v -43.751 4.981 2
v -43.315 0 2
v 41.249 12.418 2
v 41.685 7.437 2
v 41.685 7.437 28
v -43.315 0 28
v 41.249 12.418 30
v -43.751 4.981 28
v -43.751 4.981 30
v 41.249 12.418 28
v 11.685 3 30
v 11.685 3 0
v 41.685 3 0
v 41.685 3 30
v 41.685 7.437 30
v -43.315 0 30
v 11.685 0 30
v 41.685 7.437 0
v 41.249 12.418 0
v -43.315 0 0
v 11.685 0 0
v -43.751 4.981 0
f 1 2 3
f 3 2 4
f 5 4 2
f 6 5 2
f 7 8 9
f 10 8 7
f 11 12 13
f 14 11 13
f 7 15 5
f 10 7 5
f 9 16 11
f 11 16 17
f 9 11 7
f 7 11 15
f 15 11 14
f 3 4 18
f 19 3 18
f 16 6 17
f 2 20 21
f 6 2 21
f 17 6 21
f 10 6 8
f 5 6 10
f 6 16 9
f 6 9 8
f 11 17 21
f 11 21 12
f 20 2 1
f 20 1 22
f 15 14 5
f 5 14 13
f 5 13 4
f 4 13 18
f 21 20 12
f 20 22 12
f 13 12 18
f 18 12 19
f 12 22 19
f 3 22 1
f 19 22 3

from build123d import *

# Parameters (mm, degrees)
BOSS_EXTRUDE1_DEPTH = 30
SKETCH2_W           = 85.324686191
SKETCH2_H           = 2
BOSS_EXTRUDE2_DEPTH = 5


with BuildPart() as part:
    # Sketch1 → Boss-Extrude1 (new body)
    with BuildSketch(Plane.XY):
        Polygon((41.685097369, 7.4365364), (-43.314902631, 0), (11.685097369, 0), (11.685097369, 3), (41.685097369, 3), align=None)
    extrude(amount=BOSS_EXTRUDE1_DEPTH)

    # Sketch2 → Boss-Extrude2 (add)
    with BuildSketch(Plane(origin=(-0.32902535, 3.760776954, 0), x_dir=(0.9961946980917462, 0.08715574274765156, 0), z_dir=(-0.08715574274765156, 0.9961946980917462, 0))):
        with Locations((-0.487733254, -29)):
            Rectangle(SKETCH2_W, SKETCH2_H)
        with Locations((-0.487733254, -1)):
            Rectangle(SKETCH2_W, SKETCH2_H)
    extrude(amount=BOSS_EXTRUDE2_DEPTH)


solid = part.part
